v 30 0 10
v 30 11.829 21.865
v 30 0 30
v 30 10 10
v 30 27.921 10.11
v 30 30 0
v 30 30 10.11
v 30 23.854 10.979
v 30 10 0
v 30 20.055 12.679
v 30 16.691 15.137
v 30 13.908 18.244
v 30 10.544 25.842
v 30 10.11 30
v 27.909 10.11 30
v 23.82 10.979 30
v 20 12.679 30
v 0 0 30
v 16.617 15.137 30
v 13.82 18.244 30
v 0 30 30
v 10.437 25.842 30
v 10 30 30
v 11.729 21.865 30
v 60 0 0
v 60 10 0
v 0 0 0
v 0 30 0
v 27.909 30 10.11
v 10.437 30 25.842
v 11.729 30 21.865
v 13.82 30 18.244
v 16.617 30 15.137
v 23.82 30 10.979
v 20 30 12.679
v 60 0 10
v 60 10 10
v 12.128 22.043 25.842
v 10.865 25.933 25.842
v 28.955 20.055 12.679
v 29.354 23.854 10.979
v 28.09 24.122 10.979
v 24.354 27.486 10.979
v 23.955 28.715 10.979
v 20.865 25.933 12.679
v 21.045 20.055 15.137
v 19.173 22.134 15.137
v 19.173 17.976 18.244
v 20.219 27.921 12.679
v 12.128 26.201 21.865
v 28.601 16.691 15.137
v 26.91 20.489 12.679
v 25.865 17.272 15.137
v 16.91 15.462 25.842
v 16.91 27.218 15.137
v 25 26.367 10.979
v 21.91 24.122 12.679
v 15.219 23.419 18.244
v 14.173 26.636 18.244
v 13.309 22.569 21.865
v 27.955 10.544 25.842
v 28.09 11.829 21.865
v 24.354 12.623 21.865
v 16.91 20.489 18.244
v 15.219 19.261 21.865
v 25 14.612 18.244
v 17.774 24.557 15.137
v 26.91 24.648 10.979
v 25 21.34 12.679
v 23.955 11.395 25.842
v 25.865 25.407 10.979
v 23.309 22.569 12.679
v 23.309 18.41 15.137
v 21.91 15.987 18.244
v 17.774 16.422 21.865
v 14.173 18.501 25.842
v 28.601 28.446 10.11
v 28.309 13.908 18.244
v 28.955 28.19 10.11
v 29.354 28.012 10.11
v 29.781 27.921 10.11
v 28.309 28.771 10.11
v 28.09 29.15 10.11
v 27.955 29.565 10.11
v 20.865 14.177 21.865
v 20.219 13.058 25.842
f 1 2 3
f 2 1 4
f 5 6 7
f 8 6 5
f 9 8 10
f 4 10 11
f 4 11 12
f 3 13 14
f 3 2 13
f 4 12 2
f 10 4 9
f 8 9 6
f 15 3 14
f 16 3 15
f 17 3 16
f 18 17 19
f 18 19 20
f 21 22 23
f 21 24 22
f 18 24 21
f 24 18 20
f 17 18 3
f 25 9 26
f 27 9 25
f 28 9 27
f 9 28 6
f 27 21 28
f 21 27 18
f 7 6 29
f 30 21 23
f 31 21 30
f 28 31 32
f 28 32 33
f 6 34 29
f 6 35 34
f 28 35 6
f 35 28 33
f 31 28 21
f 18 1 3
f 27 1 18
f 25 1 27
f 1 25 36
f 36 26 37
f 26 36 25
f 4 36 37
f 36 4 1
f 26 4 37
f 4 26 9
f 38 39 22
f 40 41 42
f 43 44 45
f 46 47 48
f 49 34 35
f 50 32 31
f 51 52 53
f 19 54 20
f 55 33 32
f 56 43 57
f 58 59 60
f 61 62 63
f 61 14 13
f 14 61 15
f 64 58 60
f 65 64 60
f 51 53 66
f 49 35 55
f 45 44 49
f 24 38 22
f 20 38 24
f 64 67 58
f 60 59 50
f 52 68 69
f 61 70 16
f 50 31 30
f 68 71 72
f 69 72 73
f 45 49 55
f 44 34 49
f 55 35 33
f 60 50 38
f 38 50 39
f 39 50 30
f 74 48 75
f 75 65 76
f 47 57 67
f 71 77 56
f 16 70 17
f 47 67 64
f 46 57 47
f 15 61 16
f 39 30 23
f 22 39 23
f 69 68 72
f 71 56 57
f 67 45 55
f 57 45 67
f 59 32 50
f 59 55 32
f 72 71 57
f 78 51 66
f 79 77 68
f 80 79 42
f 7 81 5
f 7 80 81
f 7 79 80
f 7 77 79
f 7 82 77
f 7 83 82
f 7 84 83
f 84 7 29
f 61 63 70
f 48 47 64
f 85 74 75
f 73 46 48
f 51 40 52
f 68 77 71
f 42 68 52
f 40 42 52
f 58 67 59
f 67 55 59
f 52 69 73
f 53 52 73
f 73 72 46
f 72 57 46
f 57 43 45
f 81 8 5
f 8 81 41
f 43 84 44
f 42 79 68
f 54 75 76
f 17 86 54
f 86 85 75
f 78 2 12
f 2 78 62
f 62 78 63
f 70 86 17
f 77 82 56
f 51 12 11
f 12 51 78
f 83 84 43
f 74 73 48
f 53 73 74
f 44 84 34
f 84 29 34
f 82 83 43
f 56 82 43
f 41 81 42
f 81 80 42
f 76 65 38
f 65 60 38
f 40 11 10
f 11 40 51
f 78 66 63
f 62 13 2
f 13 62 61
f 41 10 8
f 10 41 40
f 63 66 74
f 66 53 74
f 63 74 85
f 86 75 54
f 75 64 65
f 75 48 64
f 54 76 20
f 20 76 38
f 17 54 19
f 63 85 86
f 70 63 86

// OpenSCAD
module myshape()
{
  difference() {
    union(){
      cube([30, 30, 30]);
      cube([60, 10, 10]);
    }
    translate([30, 30, 30])
      sphere(20);
	}
}

myshape();
